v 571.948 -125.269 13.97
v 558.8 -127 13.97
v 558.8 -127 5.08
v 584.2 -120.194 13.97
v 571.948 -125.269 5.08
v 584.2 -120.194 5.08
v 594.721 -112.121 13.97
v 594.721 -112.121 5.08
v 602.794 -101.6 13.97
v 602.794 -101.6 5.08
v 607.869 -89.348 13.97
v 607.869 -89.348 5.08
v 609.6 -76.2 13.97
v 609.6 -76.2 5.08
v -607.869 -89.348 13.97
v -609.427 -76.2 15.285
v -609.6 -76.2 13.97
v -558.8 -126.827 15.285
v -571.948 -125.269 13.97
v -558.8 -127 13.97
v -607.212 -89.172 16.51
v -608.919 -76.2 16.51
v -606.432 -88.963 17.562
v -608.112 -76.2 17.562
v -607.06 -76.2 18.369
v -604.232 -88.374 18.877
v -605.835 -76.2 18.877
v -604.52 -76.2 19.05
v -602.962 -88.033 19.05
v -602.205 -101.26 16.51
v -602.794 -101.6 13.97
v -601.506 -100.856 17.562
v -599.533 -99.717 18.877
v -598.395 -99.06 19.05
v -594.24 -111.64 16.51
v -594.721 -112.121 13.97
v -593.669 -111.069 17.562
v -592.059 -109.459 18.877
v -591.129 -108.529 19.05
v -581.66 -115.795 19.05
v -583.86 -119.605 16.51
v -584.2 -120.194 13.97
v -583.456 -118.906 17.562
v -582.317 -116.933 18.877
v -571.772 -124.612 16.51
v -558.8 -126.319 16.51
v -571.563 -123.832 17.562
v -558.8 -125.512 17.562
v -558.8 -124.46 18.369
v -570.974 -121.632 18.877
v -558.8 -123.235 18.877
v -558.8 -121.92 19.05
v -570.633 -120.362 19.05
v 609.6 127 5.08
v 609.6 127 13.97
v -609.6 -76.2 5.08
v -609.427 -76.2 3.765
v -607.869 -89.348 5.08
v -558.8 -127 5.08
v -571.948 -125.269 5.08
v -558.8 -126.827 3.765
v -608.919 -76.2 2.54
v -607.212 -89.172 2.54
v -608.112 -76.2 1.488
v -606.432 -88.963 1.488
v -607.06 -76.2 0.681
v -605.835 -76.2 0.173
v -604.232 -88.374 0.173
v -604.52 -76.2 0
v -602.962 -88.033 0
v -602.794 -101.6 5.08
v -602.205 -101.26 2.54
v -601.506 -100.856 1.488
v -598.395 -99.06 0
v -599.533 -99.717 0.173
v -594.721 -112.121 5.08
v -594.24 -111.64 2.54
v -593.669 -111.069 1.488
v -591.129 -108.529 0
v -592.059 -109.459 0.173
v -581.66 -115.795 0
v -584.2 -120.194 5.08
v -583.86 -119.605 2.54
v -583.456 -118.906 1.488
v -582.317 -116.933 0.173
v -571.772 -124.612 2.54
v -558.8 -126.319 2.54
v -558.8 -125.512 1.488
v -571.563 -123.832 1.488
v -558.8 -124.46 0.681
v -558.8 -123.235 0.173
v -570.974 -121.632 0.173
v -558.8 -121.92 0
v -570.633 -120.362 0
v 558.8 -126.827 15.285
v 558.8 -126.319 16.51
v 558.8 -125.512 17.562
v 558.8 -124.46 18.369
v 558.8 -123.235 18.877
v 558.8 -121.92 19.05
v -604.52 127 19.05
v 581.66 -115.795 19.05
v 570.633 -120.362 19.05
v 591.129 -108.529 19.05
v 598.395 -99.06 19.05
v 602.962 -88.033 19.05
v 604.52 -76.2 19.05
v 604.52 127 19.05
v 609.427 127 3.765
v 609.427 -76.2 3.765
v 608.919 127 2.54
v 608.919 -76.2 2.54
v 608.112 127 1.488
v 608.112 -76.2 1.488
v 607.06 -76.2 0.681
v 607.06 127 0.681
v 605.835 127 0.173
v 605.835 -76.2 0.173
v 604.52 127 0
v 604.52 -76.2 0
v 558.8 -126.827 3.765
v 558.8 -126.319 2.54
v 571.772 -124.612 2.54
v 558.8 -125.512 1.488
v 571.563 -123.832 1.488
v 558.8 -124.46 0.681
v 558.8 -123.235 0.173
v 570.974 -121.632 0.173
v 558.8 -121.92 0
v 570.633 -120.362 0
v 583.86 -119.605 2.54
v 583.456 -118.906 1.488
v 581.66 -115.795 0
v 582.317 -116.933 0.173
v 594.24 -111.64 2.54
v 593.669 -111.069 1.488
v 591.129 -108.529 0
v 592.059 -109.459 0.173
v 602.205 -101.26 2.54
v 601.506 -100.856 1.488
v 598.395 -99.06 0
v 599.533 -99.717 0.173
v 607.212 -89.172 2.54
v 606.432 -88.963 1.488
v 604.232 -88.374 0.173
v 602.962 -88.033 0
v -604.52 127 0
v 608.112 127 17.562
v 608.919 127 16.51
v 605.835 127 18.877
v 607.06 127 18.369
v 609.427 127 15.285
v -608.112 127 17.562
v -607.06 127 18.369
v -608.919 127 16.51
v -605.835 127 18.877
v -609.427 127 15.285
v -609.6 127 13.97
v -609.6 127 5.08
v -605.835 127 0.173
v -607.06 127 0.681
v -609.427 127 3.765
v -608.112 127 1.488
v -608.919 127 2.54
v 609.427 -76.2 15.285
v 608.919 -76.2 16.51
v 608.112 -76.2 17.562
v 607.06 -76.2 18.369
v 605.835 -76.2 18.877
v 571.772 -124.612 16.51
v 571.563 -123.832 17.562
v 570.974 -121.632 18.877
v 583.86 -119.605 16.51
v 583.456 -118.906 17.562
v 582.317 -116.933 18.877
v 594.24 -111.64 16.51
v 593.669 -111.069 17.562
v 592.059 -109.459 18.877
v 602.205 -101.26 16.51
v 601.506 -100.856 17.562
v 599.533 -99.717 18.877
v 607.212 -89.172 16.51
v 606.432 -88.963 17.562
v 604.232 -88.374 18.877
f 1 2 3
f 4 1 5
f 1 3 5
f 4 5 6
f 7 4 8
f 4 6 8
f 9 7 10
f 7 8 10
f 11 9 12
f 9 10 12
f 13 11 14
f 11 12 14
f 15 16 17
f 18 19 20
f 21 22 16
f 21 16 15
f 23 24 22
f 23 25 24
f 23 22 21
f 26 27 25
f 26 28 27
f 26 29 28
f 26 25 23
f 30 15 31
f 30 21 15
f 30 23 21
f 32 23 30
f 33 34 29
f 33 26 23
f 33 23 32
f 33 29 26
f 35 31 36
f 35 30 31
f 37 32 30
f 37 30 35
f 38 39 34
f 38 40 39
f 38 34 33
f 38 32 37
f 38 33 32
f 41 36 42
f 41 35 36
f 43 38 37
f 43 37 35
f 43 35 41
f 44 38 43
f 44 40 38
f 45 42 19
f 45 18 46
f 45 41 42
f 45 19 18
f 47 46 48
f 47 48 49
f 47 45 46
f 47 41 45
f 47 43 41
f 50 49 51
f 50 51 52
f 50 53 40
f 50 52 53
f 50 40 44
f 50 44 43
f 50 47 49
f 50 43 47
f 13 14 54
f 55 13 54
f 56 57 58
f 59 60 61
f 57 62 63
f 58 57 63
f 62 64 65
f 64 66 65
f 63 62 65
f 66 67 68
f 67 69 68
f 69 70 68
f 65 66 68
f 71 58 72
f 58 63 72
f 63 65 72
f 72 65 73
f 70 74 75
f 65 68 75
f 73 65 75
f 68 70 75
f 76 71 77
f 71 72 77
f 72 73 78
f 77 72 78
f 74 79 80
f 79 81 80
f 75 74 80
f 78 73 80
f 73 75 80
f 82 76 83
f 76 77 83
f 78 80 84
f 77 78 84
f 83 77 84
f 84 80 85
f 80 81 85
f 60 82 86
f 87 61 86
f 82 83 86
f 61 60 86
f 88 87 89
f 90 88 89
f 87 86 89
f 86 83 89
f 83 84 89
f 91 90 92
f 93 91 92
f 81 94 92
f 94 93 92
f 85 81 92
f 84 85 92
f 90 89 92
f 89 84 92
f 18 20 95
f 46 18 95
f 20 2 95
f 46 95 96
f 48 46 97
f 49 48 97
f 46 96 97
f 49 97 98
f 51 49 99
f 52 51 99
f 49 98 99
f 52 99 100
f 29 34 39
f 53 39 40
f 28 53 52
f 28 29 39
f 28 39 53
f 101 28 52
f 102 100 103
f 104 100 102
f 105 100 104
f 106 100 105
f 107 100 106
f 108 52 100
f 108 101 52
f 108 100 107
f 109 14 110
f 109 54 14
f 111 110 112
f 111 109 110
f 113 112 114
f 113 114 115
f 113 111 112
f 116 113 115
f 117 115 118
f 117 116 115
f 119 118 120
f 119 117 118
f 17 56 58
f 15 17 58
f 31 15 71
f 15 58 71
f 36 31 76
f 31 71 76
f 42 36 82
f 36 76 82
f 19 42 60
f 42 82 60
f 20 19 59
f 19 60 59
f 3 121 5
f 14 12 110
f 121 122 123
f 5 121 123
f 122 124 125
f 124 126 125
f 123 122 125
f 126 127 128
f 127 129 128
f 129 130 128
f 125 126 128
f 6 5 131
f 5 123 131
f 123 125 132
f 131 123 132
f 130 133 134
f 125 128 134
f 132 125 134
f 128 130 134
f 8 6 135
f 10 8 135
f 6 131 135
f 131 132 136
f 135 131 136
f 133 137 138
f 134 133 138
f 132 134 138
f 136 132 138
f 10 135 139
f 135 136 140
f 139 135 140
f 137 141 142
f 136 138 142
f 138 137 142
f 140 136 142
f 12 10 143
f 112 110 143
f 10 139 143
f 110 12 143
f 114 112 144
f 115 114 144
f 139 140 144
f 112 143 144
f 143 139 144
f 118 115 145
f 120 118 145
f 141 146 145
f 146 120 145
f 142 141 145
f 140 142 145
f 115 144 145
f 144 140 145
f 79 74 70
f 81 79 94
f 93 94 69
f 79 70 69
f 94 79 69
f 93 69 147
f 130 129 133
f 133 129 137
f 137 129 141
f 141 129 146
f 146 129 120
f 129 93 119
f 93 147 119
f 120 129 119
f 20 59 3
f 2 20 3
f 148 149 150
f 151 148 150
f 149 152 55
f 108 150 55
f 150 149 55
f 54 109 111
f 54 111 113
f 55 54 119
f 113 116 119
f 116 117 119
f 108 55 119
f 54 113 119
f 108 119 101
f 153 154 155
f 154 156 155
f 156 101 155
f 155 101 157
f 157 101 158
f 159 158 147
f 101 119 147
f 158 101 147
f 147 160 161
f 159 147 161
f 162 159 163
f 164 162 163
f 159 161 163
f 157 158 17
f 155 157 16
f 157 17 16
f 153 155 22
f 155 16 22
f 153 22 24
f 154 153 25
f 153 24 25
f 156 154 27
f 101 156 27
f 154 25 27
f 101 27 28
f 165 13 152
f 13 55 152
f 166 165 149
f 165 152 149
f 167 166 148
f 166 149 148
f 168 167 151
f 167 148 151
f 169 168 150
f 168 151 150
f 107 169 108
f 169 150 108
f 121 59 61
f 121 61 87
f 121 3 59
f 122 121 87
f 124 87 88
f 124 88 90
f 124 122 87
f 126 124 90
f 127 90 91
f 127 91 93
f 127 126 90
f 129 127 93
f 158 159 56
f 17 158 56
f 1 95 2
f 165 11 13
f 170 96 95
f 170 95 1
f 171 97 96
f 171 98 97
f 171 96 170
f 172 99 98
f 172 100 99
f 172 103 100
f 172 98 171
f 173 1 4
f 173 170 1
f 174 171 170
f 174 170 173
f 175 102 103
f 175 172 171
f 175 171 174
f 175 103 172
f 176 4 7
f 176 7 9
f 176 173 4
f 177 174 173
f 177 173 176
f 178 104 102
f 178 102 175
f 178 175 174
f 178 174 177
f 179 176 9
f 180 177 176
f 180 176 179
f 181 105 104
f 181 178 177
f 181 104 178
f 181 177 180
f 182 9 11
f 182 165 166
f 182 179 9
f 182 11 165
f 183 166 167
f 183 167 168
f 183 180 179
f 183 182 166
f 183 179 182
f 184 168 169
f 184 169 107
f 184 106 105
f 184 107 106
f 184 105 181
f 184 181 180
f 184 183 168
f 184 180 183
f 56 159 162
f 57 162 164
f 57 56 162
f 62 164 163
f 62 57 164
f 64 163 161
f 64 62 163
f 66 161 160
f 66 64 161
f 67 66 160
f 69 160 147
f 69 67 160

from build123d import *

# Parameters (mm, degrees)
F1_DEPTH = 19.05
F2_R     = 5.08
F3_R     = 5.08


with BuildPart() as f1:
    # F0 (on Top) → F1 (new body)
    with BuildSketch(Plane.XY):
        with BuildLine():
            Line((-558.8, -127), (558.8, -127))
            ThreePointArc((558.8, -127), (594.721024, -112.121024), (609.6, -76.2))
            Line((609.6, -76.2), (609.6, 127))
            Line((609.6, 127), (-609.6, 127))
            Line((-609.6, 127), (-609.6, -76.2))
            ThreePointArc((-609.6, -76.2), (-594.721024, -112.121024), (-558.8, -127))
        make_face()
    extrude(amount=F1_DEPTH)

    # F2
    f2_edges = [f1.edges().sort_by_distance(p)[0] for p in [
        (0, -127, 19.05),
    ]]
    fillet(f2_edges, radius=F2_R)

    # F3
    f3_edges = [f1.edges().sort_by_distance(p)[0] for p in [
        (0, -127, 0),
    ]]
    fillet(f3_edges, radius=F3_R)


solid = f1.part
